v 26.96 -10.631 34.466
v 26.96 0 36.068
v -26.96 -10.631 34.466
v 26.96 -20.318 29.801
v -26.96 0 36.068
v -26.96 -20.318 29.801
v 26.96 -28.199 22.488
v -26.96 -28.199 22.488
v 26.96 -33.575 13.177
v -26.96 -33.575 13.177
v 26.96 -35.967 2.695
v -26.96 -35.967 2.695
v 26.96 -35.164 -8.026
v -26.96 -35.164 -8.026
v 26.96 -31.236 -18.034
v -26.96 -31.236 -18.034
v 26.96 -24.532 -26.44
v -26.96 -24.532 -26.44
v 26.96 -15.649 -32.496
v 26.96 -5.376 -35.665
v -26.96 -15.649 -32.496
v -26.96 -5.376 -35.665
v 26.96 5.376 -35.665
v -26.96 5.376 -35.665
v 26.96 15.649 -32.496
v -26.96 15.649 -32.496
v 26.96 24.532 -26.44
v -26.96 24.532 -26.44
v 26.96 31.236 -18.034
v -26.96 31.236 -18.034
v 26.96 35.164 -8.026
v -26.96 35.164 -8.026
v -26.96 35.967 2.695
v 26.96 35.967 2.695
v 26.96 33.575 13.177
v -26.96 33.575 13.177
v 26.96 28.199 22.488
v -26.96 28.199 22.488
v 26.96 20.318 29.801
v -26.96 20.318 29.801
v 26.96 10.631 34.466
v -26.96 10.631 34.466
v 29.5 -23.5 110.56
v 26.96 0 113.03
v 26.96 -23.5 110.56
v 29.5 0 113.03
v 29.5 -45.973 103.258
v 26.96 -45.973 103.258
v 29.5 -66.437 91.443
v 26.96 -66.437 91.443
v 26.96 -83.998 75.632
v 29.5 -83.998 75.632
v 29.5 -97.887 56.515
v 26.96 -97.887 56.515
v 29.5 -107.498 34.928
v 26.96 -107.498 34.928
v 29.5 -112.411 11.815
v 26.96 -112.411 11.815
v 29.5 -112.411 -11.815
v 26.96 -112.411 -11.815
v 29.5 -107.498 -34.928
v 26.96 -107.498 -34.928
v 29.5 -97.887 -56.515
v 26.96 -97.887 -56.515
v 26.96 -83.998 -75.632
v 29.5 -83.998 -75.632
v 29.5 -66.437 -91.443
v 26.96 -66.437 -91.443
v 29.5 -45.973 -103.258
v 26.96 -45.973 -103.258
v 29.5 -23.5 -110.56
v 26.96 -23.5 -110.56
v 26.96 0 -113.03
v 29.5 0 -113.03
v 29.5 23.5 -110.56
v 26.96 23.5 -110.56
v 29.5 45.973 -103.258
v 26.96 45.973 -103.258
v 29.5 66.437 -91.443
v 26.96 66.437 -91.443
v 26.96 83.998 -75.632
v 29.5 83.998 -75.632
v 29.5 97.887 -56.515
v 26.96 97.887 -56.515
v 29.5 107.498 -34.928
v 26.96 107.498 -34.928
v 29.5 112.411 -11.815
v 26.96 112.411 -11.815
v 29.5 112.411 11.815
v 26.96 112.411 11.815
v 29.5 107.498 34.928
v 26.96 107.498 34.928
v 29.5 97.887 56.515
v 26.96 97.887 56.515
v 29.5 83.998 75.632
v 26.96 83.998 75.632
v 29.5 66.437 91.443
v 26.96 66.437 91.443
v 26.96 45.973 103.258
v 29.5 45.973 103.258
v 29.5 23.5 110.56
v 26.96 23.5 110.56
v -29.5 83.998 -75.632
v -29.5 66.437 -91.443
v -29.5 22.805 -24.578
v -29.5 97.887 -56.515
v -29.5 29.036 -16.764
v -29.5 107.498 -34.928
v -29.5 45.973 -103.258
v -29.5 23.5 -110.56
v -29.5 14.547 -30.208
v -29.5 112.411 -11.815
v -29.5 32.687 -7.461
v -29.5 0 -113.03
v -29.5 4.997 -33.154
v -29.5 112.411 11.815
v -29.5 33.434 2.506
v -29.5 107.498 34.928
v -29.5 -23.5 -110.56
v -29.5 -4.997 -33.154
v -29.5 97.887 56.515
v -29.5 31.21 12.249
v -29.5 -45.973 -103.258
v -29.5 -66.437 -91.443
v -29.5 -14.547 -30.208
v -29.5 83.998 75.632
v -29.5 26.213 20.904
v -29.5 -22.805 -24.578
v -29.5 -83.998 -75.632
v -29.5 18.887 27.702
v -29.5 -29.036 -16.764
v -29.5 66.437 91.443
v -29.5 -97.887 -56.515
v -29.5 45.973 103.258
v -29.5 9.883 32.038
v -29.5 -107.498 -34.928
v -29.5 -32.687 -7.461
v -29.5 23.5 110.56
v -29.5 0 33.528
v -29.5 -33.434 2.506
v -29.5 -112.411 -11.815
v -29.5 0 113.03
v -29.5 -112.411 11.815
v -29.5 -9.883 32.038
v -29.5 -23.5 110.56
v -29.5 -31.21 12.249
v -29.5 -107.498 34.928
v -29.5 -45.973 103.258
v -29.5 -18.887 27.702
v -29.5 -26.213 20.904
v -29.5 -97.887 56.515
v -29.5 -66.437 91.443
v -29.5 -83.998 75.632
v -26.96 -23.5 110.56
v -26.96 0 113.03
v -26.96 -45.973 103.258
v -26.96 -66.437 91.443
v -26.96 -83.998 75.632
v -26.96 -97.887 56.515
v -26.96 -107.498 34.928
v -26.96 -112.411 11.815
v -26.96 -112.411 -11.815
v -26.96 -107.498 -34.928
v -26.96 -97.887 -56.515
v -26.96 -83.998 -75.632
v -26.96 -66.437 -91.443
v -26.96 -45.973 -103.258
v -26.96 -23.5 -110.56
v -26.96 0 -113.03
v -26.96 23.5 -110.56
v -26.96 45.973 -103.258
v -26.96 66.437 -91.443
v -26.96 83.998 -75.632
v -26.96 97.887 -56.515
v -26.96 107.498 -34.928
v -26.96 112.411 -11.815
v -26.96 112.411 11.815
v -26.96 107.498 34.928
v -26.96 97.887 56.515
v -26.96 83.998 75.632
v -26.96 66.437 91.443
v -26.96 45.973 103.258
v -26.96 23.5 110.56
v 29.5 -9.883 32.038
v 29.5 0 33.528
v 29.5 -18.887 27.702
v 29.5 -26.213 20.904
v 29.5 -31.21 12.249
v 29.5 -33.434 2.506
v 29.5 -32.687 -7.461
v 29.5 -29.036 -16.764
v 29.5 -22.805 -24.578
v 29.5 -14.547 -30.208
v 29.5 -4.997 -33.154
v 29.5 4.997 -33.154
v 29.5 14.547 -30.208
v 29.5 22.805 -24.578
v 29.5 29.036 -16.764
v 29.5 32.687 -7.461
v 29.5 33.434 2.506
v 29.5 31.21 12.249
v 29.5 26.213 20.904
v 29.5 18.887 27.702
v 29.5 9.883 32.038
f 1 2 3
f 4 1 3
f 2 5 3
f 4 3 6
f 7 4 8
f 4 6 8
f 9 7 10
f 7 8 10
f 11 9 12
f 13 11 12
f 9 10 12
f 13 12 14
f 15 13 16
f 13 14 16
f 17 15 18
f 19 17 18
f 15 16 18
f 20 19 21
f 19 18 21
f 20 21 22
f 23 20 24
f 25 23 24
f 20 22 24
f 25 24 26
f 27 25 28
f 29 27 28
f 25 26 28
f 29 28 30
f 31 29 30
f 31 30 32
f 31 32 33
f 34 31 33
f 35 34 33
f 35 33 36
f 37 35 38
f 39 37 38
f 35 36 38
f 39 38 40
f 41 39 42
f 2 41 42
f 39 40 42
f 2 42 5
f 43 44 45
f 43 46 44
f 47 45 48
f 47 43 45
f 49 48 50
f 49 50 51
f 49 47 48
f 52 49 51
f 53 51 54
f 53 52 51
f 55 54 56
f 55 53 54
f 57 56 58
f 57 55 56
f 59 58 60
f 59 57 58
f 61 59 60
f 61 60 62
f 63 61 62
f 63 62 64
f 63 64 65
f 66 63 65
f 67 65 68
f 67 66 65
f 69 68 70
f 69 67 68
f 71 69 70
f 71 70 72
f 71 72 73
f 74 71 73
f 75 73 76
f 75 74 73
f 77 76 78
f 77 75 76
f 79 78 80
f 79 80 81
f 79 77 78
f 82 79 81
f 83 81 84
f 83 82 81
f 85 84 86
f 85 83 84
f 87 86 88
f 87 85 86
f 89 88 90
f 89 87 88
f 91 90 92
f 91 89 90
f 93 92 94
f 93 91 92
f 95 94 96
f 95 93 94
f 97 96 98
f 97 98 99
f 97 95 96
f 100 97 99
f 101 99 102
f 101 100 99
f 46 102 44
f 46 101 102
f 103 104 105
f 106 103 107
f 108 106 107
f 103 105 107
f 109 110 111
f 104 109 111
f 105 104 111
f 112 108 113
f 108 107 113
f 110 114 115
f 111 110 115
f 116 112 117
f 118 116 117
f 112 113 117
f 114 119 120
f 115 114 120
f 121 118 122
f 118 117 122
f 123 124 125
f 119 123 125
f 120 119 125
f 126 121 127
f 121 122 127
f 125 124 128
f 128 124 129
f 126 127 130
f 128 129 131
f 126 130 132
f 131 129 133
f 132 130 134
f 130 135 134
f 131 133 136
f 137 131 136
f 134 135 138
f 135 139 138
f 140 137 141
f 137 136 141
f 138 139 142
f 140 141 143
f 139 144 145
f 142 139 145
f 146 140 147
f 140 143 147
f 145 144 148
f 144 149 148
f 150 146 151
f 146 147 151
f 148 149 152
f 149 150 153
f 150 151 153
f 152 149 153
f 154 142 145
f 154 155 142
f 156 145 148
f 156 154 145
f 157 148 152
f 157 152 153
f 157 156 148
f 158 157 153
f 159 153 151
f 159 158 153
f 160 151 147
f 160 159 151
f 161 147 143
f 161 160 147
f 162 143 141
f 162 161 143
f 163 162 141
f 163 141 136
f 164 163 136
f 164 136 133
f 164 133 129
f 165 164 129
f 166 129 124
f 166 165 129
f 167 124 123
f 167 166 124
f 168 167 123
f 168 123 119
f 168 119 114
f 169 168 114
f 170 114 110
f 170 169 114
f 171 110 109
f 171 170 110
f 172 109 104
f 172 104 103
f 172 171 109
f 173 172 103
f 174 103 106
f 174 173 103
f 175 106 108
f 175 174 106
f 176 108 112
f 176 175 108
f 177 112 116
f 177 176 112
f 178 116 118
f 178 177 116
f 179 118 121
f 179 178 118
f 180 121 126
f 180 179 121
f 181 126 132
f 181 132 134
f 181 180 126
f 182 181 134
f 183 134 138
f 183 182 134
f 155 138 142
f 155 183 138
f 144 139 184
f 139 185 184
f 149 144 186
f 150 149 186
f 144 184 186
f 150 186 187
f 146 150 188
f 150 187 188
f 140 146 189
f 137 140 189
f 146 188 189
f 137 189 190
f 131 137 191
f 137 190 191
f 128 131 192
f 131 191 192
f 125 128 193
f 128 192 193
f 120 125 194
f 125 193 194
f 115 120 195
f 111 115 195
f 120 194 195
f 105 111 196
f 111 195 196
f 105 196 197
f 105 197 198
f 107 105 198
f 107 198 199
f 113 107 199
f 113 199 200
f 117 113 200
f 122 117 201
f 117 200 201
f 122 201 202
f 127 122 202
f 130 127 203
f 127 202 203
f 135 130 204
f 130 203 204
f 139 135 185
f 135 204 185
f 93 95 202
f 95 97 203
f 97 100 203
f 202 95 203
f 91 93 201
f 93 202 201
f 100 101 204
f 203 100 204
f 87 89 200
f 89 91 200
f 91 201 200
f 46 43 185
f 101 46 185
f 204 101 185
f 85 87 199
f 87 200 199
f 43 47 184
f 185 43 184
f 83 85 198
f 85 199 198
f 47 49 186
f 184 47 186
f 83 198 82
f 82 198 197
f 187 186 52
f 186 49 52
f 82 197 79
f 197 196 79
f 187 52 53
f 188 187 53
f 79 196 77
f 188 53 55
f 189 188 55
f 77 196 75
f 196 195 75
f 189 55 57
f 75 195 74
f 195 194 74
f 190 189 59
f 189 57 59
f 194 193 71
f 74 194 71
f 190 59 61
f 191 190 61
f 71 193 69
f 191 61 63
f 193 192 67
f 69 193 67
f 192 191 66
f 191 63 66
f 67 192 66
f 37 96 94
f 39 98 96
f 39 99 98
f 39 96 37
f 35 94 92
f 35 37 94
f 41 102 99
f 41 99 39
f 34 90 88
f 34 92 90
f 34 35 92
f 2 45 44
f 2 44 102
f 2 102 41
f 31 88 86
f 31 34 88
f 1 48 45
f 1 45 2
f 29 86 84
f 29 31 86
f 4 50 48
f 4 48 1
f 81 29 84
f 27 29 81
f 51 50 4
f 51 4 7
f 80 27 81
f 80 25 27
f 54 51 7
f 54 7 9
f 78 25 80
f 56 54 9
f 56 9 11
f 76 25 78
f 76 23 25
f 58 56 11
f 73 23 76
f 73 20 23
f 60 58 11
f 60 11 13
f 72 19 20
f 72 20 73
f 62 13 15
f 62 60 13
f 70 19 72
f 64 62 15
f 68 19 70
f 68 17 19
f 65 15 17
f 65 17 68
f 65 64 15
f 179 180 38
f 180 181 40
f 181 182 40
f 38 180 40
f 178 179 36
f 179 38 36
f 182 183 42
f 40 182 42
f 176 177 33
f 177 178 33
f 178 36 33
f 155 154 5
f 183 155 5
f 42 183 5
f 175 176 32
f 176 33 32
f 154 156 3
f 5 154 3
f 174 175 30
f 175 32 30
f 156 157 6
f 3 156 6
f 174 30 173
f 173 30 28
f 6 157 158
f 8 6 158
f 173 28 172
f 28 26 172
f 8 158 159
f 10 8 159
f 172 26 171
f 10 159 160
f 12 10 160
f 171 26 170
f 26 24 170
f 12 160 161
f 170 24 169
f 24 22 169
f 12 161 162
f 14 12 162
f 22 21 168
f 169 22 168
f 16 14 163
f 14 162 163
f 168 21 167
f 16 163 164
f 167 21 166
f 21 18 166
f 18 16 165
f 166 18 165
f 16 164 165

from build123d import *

# Parameters (mm, degrees)
F0_W   = 2.54
F0_H   = 2.54
F0_H_2 = 76.962


with BuildPart() as f1:
    # F0 (on Front) → F1 (revolve)
    with BuildSketch(Plane.XZ):
        Polygon((-26.96, 33.528), (0, 33.528), (26.96, 33.528), (26.96, 36.068), (0, 36.068), (-26.96, 36.068), align=None)
        with Locations((28.23, 34.798)):
            Rectangle(F0_W, F0_H)
        with Locations((-28.23, 34.798)):
            Rectangle(F0_W, F0_H)
        with Locations((28.23, 74.549)):
            Rectangle(F0_W, F0_H_2)
        with Locations((-28.23, 74.549)):
            Rectangle(F0_W, F0_H_2)
    revolve(axis=Axis((13.856179, 0, 0), (1, 0, 0)))


solid = f1.part
